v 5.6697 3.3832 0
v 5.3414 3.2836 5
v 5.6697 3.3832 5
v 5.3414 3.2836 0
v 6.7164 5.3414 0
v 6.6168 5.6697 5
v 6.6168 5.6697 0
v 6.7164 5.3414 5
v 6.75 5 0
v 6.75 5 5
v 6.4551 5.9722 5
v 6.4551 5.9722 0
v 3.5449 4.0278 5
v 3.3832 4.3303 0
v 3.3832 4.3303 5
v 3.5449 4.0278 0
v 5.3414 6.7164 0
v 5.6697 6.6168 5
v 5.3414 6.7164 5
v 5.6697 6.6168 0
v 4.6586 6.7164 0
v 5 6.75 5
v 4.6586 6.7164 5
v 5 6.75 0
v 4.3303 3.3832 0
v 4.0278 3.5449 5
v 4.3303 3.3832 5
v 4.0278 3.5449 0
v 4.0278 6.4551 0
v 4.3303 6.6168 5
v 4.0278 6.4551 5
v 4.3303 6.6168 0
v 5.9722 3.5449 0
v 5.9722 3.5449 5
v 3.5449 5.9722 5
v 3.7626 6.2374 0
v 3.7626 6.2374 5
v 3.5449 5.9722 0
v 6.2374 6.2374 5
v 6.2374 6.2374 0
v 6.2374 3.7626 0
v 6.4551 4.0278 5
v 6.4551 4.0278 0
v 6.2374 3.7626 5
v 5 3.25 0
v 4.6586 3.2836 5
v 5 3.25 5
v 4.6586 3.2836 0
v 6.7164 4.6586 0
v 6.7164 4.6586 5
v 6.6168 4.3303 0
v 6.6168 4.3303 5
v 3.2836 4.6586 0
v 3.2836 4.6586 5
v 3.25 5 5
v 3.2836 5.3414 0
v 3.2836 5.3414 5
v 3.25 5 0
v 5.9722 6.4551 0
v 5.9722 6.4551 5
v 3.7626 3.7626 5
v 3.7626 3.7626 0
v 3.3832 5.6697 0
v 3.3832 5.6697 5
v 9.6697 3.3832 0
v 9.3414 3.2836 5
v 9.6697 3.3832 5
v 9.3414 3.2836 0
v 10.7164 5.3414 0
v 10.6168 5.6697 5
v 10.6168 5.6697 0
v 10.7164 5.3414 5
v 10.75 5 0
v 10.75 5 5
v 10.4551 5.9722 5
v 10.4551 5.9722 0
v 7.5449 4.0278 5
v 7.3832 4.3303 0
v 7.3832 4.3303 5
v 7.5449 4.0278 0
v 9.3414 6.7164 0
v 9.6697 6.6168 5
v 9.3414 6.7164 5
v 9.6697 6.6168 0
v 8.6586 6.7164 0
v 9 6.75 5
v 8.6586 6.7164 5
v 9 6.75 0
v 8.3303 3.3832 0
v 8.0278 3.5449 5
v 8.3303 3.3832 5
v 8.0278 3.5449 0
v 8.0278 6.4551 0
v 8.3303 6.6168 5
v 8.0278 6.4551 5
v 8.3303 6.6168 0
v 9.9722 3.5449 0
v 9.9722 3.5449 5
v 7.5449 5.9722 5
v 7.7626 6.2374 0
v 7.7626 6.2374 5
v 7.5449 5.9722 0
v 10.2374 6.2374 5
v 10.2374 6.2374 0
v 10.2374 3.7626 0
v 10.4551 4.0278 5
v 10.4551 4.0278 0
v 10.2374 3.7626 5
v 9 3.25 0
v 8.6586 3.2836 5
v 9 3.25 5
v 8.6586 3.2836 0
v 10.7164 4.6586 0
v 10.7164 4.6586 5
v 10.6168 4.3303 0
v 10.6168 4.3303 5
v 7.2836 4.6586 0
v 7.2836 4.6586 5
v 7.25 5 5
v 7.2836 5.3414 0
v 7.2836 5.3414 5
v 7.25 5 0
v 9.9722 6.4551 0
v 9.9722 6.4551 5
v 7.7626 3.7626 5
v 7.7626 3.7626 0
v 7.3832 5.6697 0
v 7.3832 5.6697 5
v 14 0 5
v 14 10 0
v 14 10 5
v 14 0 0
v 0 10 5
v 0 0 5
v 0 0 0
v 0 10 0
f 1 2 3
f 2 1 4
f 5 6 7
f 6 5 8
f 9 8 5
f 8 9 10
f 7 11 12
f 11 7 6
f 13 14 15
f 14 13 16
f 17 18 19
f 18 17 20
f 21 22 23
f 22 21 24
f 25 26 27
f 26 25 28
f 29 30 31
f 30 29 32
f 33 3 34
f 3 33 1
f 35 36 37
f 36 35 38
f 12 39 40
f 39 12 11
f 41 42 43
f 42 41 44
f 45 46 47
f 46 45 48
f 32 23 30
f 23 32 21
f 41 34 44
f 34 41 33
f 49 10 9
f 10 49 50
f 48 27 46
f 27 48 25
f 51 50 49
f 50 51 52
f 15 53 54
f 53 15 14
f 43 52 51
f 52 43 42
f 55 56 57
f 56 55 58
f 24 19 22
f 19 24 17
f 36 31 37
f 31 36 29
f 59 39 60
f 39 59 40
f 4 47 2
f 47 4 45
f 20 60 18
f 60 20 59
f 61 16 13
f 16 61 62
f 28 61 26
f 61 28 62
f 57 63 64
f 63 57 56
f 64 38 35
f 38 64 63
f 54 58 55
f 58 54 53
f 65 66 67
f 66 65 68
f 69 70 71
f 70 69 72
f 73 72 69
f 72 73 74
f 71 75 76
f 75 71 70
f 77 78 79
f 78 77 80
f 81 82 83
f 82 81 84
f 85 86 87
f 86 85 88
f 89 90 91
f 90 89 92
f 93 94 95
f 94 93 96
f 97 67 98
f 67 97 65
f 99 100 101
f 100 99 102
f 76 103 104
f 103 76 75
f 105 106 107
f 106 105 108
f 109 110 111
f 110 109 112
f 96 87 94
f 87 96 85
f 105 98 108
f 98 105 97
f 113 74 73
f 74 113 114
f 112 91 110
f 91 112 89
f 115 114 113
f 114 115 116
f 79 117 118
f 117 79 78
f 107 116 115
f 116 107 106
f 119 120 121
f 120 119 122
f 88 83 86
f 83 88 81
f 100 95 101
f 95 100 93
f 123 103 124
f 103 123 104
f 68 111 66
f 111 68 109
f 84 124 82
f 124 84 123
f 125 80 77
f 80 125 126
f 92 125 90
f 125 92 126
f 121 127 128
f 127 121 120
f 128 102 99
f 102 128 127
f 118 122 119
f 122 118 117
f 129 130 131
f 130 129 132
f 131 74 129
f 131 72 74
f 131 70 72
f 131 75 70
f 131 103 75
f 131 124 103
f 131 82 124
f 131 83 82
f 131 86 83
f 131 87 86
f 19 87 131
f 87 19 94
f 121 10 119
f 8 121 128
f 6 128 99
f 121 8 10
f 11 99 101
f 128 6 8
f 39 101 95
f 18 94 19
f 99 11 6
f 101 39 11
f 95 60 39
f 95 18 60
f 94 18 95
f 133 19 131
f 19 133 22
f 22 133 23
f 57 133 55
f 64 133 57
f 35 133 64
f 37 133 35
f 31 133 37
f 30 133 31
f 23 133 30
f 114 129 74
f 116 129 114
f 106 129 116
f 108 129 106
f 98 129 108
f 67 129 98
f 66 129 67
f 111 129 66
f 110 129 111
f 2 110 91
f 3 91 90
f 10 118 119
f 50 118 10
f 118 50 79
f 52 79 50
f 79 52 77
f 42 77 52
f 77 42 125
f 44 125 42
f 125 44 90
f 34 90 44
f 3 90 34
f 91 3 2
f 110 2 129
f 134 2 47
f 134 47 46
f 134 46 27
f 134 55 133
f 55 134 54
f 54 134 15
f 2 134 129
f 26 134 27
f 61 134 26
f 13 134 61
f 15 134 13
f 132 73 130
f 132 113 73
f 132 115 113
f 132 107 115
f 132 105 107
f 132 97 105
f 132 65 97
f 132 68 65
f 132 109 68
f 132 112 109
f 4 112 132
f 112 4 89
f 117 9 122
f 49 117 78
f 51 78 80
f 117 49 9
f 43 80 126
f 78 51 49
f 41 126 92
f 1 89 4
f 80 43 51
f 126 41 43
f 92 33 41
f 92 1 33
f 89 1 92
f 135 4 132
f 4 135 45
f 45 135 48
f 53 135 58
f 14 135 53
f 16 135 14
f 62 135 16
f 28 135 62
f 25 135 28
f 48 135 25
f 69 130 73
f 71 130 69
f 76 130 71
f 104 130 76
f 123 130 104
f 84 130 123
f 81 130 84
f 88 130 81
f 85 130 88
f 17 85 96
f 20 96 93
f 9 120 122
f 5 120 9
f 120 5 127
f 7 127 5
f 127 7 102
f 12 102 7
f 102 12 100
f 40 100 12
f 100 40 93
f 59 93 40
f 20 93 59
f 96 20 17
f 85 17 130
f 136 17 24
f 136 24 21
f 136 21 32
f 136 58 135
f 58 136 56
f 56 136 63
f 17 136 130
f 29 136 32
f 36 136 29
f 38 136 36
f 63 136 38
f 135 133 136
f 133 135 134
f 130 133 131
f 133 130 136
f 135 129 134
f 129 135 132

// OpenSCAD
$fn = 32;

// ----------------------------------------------------------------------
// Micro pad: two-hole pad, 5-20 mm class
// ----------------------------------------------------------------------

// --- parameters (mm) ---
pad_l = 14;               // pad length, X
pad_w = 10;               // pad width, Y
pad_t = 5;                // pad thickness, Z
hole_d = 3.5;             // hole diameter
hole_x = 5;               // X of the first hole centre
fit_tol = 0.1;            // tolerance for press fits, mm
free_tol = 0.5;           // tolerance for clearance fits, mm

difference() {
  cube([pad_l, pad_w, pad_t]);
  for (x = [hole_x, pad_l - hole_x])
    translate([x, pad_w / 2, -1])
      cylinder(h = pad_t + 2, d = hole_d);
}
